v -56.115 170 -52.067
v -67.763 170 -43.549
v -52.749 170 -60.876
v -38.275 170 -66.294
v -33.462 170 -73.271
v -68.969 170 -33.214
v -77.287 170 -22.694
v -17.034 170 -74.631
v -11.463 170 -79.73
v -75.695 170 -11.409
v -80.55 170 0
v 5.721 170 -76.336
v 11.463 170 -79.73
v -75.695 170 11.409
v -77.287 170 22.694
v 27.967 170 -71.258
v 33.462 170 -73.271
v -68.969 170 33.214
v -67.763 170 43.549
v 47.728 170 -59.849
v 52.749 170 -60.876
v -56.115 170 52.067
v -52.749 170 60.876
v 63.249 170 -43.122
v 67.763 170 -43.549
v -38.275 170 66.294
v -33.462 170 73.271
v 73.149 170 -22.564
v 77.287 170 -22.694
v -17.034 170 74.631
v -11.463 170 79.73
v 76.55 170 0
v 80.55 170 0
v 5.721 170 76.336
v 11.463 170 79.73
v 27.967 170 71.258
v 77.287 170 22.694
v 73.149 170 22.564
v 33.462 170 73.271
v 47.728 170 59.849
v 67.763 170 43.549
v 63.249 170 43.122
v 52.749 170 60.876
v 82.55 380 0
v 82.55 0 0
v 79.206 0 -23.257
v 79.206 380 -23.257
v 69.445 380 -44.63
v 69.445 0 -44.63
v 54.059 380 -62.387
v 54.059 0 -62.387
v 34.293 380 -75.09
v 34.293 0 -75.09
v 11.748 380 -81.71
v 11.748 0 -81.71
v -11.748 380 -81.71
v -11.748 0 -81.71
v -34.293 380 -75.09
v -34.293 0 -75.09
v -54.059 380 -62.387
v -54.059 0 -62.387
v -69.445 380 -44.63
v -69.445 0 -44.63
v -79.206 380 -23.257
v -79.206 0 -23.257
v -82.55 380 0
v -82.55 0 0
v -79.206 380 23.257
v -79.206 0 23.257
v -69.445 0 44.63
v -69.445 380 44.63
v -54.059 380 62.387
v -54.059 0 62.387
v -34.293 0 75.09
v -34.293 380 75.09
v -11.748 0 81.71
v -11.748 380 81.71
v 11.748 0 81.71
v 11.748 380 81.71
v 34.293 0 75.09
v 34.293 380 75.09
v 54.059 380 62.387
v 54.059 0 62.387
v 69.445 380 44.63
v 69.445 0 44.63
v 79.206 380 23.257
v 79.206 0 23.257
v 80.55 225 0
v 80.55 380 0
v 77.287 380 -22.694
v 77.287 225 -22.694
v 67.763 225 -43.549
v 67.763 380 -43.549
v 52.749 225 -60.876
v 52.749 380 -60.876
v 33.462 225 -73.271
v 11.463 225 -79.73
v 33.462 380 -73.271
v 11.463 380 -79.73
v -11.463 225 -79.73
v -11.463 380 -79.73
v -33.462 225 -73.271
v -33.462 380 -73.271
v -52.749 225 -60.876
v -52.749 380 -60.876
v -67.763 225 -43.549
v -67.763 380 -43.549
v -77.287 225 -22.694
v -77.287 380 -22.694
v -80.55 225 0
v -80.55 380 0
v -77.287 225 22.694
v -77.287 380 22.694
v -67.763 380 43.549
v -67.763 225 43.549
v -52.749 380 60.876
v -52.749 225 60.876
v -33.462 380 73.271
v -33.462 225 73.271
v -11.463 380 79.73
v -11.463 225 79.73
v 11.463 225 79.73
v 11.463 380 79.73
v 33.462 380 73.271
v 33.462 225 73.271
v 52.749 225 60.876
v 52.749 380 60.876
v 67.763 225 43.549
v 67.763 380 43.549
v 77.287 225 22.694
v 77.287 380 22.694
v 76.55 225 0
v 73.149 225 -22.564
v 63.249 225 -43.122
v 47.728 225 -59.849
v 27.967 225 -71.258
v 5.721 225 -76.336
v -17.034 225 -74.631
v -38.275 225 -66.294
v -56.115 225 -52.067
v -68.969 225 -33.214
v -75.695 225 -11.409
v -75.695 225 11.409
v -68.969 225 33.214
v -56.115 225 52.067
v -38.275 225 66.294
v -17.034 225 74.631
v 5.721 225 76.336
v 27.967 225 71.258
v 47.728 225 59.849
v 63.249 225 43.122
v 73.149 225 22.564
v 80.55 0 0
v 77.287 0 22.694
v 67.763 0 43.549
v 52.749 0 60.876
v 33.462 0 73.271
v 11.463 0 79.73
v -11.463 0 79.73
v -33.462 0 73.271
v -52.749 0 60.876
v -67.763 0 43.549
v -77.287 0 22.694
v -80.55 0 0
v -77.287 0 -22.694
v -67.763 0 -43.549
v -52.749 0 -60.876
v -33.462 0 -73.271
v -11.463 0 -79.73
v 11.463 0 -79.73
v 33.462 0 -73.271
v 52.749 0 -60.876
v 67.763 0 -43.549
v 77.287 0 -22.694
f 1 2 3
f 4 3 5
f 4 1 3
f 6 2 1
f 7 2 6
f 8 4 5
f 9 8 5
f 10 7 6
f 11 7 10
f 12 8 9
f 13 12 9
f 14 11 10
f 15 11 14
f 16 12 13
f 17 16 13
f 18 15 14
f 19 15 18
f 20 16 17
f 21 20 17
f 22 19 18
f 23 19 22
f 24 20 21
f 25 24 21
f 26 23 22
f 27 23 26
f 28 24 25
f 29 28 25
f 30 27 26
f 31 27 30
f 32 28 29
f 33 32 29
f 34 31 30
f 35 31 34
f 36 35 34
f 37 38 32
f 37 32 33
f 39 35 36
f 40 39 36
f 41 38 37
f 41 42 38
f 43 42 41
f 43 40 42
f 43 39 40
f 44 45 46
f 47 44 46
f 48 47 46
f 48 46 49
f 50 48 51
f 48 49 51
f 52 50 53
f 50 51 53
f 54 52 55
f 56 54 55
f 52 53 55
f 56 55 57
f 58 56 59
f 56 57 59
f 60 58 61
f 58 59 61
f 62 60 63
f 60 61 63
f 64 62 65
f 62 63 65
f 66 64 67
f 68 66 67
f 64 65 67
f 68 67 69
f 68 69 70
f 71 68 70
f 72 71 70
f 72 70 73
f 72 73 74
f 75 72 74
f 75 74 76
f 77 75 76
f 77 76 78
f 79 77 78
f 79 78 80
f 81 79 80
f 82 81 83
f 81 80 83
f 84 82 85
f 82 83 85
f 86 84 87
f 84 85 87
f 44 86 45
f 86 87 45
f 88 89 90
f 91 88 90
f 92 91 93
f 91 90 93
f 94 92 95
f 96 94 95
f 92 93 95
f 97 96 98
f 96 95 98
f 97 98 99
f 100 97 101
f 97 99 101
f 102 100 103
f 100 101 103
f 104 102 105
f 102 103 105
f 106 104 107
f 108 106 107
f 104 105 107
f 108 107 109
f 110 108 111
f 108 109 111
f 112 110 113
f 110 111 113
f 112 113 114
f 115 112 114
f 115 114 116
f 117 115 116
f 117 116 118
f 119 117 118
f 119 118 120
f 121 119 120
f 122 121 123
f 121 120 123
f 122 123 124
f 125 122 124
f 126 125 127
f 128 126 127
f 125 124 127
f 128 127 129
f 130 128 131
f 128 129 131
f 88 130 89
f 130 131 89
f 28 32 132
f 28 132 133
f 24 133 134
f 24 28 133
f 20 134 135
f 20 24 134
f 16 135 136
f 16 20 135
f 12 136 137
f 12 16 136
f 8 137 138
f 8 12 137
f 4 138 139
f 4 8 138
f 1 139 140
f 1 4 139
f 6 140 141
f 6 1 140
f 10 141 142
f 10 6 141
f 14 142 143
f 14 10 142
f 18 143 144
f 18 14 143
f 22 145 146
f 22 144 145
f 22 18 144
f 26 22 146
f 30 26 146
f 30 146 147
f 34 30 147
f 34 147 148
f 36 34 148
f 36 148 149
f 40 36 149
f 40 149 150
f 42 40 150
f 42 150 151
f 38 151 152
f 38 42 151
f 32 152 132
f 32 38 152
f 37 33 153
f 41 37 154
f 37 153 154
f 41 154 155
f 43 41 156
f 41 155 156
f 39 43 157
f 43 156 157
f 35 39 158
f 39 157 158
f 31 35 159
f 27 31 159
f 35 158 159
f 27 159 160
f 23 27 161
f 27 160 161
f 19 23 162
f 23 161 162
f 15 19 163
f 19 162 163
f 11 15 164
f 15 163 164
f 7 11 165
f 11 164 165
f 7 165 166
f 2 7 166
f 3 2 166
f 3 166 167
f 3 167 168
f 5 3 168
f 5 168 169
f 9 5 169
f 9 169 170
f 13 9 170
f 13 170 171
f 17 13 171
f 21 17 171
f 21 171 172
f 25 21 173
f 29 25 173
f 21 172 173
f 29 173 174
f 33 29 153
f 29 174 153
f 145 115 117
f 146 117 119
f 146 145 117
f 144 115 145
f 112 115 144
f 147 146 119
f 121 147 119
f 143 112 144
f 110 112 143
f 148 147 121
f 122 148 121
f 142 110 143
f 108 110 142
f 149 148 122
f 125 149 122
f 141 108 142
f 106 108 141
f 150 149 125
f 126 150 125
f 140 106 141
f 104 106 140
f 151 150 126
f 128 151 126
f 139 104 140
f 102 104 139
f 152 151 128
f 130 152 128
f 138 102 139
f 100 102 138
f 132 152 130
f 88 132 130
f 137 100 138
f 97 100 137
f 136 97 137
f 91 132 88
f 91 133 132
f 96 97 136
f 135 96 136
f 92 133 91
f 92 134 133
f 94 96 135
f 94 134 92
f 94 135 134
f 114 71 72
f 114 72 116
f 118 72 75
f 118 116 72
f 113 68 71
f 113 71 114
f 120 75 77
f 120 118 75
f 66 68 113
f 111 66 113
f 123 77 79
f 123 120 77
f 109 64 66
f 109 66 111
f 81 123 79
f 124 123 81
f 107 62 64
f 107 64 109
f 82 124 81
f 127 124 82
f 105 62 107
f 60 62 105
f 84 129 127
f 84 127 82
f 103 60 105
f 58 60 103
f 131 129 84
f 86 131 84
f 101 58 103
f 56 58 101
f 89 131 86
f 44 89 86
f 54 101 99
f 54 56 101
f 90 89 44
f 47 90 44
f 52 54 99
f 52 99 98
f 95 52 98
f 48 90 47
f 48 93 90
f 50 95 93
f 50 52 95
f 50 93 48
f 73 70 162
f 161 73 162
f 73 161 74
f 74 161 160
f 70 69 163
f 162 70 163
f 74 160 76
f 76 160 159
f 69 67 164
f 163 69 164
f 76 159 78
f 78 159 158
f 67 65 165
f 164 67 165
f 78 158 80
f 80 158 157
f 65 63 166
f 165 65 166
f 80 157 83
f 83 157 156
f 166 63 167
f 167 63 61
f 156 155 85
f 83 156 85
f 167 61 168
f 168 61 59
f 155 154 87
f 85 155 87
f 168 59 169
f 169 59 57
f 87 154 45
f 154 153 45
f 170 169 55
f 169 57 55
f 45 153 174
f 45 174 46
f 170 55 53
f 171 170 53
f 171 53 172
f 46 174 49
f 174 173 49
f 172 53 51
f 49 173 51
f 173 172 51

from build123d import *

# Parameters (mm, degrees)
SKETCH1_R           = 82.55
SKETCH1_R_2         = 76.55
BOSS_EXTRUDE1_DEPTH = 380
SKETCH2_R           = 80.55
CUT_EXTRUDE1_DEPTH  = 170
SKETCH3_R           = 80.55
CUT_EXTRUDE2_DEPTH  = 155


with BuildPart() as part:
    # Sketch1 → Boss-Extrude1 (new body)
    with BuildSketch(Plane(origin=(0, 0, 0), x_dir=(1, 0, 0), z_dir=(0, 1, 0))):
        Circle(SKETCH1_R)
        Circle(SKETCH1_R_2, mode=Mode.SUBTRACT)
    extrude(amount=BOSS_EXTRUDE1_DEPTH)

    # Sketch2 → Cut-Extrude1 (cut)
    with BuildSketch(Plane.XZ):
        Circle(SKETCH2_R)
    extrude(amount=-CUT_EXTRUDE1_DEPTH, mode=Mode.SUBTRACT)

    # Sketch3 → Cut-Extrude2 (cut)
    with BuildSketch(Plane(origin=(0, 380, 0), x_dir=(1, 0, 0), z_dir=(0, 1, 0))):
        Circle(SKETCH3_R)
    extrude(amount=-CUT_EXTRUDE2_DEPTH, mode=Mode.SUBTRACT)


solid = part.part
